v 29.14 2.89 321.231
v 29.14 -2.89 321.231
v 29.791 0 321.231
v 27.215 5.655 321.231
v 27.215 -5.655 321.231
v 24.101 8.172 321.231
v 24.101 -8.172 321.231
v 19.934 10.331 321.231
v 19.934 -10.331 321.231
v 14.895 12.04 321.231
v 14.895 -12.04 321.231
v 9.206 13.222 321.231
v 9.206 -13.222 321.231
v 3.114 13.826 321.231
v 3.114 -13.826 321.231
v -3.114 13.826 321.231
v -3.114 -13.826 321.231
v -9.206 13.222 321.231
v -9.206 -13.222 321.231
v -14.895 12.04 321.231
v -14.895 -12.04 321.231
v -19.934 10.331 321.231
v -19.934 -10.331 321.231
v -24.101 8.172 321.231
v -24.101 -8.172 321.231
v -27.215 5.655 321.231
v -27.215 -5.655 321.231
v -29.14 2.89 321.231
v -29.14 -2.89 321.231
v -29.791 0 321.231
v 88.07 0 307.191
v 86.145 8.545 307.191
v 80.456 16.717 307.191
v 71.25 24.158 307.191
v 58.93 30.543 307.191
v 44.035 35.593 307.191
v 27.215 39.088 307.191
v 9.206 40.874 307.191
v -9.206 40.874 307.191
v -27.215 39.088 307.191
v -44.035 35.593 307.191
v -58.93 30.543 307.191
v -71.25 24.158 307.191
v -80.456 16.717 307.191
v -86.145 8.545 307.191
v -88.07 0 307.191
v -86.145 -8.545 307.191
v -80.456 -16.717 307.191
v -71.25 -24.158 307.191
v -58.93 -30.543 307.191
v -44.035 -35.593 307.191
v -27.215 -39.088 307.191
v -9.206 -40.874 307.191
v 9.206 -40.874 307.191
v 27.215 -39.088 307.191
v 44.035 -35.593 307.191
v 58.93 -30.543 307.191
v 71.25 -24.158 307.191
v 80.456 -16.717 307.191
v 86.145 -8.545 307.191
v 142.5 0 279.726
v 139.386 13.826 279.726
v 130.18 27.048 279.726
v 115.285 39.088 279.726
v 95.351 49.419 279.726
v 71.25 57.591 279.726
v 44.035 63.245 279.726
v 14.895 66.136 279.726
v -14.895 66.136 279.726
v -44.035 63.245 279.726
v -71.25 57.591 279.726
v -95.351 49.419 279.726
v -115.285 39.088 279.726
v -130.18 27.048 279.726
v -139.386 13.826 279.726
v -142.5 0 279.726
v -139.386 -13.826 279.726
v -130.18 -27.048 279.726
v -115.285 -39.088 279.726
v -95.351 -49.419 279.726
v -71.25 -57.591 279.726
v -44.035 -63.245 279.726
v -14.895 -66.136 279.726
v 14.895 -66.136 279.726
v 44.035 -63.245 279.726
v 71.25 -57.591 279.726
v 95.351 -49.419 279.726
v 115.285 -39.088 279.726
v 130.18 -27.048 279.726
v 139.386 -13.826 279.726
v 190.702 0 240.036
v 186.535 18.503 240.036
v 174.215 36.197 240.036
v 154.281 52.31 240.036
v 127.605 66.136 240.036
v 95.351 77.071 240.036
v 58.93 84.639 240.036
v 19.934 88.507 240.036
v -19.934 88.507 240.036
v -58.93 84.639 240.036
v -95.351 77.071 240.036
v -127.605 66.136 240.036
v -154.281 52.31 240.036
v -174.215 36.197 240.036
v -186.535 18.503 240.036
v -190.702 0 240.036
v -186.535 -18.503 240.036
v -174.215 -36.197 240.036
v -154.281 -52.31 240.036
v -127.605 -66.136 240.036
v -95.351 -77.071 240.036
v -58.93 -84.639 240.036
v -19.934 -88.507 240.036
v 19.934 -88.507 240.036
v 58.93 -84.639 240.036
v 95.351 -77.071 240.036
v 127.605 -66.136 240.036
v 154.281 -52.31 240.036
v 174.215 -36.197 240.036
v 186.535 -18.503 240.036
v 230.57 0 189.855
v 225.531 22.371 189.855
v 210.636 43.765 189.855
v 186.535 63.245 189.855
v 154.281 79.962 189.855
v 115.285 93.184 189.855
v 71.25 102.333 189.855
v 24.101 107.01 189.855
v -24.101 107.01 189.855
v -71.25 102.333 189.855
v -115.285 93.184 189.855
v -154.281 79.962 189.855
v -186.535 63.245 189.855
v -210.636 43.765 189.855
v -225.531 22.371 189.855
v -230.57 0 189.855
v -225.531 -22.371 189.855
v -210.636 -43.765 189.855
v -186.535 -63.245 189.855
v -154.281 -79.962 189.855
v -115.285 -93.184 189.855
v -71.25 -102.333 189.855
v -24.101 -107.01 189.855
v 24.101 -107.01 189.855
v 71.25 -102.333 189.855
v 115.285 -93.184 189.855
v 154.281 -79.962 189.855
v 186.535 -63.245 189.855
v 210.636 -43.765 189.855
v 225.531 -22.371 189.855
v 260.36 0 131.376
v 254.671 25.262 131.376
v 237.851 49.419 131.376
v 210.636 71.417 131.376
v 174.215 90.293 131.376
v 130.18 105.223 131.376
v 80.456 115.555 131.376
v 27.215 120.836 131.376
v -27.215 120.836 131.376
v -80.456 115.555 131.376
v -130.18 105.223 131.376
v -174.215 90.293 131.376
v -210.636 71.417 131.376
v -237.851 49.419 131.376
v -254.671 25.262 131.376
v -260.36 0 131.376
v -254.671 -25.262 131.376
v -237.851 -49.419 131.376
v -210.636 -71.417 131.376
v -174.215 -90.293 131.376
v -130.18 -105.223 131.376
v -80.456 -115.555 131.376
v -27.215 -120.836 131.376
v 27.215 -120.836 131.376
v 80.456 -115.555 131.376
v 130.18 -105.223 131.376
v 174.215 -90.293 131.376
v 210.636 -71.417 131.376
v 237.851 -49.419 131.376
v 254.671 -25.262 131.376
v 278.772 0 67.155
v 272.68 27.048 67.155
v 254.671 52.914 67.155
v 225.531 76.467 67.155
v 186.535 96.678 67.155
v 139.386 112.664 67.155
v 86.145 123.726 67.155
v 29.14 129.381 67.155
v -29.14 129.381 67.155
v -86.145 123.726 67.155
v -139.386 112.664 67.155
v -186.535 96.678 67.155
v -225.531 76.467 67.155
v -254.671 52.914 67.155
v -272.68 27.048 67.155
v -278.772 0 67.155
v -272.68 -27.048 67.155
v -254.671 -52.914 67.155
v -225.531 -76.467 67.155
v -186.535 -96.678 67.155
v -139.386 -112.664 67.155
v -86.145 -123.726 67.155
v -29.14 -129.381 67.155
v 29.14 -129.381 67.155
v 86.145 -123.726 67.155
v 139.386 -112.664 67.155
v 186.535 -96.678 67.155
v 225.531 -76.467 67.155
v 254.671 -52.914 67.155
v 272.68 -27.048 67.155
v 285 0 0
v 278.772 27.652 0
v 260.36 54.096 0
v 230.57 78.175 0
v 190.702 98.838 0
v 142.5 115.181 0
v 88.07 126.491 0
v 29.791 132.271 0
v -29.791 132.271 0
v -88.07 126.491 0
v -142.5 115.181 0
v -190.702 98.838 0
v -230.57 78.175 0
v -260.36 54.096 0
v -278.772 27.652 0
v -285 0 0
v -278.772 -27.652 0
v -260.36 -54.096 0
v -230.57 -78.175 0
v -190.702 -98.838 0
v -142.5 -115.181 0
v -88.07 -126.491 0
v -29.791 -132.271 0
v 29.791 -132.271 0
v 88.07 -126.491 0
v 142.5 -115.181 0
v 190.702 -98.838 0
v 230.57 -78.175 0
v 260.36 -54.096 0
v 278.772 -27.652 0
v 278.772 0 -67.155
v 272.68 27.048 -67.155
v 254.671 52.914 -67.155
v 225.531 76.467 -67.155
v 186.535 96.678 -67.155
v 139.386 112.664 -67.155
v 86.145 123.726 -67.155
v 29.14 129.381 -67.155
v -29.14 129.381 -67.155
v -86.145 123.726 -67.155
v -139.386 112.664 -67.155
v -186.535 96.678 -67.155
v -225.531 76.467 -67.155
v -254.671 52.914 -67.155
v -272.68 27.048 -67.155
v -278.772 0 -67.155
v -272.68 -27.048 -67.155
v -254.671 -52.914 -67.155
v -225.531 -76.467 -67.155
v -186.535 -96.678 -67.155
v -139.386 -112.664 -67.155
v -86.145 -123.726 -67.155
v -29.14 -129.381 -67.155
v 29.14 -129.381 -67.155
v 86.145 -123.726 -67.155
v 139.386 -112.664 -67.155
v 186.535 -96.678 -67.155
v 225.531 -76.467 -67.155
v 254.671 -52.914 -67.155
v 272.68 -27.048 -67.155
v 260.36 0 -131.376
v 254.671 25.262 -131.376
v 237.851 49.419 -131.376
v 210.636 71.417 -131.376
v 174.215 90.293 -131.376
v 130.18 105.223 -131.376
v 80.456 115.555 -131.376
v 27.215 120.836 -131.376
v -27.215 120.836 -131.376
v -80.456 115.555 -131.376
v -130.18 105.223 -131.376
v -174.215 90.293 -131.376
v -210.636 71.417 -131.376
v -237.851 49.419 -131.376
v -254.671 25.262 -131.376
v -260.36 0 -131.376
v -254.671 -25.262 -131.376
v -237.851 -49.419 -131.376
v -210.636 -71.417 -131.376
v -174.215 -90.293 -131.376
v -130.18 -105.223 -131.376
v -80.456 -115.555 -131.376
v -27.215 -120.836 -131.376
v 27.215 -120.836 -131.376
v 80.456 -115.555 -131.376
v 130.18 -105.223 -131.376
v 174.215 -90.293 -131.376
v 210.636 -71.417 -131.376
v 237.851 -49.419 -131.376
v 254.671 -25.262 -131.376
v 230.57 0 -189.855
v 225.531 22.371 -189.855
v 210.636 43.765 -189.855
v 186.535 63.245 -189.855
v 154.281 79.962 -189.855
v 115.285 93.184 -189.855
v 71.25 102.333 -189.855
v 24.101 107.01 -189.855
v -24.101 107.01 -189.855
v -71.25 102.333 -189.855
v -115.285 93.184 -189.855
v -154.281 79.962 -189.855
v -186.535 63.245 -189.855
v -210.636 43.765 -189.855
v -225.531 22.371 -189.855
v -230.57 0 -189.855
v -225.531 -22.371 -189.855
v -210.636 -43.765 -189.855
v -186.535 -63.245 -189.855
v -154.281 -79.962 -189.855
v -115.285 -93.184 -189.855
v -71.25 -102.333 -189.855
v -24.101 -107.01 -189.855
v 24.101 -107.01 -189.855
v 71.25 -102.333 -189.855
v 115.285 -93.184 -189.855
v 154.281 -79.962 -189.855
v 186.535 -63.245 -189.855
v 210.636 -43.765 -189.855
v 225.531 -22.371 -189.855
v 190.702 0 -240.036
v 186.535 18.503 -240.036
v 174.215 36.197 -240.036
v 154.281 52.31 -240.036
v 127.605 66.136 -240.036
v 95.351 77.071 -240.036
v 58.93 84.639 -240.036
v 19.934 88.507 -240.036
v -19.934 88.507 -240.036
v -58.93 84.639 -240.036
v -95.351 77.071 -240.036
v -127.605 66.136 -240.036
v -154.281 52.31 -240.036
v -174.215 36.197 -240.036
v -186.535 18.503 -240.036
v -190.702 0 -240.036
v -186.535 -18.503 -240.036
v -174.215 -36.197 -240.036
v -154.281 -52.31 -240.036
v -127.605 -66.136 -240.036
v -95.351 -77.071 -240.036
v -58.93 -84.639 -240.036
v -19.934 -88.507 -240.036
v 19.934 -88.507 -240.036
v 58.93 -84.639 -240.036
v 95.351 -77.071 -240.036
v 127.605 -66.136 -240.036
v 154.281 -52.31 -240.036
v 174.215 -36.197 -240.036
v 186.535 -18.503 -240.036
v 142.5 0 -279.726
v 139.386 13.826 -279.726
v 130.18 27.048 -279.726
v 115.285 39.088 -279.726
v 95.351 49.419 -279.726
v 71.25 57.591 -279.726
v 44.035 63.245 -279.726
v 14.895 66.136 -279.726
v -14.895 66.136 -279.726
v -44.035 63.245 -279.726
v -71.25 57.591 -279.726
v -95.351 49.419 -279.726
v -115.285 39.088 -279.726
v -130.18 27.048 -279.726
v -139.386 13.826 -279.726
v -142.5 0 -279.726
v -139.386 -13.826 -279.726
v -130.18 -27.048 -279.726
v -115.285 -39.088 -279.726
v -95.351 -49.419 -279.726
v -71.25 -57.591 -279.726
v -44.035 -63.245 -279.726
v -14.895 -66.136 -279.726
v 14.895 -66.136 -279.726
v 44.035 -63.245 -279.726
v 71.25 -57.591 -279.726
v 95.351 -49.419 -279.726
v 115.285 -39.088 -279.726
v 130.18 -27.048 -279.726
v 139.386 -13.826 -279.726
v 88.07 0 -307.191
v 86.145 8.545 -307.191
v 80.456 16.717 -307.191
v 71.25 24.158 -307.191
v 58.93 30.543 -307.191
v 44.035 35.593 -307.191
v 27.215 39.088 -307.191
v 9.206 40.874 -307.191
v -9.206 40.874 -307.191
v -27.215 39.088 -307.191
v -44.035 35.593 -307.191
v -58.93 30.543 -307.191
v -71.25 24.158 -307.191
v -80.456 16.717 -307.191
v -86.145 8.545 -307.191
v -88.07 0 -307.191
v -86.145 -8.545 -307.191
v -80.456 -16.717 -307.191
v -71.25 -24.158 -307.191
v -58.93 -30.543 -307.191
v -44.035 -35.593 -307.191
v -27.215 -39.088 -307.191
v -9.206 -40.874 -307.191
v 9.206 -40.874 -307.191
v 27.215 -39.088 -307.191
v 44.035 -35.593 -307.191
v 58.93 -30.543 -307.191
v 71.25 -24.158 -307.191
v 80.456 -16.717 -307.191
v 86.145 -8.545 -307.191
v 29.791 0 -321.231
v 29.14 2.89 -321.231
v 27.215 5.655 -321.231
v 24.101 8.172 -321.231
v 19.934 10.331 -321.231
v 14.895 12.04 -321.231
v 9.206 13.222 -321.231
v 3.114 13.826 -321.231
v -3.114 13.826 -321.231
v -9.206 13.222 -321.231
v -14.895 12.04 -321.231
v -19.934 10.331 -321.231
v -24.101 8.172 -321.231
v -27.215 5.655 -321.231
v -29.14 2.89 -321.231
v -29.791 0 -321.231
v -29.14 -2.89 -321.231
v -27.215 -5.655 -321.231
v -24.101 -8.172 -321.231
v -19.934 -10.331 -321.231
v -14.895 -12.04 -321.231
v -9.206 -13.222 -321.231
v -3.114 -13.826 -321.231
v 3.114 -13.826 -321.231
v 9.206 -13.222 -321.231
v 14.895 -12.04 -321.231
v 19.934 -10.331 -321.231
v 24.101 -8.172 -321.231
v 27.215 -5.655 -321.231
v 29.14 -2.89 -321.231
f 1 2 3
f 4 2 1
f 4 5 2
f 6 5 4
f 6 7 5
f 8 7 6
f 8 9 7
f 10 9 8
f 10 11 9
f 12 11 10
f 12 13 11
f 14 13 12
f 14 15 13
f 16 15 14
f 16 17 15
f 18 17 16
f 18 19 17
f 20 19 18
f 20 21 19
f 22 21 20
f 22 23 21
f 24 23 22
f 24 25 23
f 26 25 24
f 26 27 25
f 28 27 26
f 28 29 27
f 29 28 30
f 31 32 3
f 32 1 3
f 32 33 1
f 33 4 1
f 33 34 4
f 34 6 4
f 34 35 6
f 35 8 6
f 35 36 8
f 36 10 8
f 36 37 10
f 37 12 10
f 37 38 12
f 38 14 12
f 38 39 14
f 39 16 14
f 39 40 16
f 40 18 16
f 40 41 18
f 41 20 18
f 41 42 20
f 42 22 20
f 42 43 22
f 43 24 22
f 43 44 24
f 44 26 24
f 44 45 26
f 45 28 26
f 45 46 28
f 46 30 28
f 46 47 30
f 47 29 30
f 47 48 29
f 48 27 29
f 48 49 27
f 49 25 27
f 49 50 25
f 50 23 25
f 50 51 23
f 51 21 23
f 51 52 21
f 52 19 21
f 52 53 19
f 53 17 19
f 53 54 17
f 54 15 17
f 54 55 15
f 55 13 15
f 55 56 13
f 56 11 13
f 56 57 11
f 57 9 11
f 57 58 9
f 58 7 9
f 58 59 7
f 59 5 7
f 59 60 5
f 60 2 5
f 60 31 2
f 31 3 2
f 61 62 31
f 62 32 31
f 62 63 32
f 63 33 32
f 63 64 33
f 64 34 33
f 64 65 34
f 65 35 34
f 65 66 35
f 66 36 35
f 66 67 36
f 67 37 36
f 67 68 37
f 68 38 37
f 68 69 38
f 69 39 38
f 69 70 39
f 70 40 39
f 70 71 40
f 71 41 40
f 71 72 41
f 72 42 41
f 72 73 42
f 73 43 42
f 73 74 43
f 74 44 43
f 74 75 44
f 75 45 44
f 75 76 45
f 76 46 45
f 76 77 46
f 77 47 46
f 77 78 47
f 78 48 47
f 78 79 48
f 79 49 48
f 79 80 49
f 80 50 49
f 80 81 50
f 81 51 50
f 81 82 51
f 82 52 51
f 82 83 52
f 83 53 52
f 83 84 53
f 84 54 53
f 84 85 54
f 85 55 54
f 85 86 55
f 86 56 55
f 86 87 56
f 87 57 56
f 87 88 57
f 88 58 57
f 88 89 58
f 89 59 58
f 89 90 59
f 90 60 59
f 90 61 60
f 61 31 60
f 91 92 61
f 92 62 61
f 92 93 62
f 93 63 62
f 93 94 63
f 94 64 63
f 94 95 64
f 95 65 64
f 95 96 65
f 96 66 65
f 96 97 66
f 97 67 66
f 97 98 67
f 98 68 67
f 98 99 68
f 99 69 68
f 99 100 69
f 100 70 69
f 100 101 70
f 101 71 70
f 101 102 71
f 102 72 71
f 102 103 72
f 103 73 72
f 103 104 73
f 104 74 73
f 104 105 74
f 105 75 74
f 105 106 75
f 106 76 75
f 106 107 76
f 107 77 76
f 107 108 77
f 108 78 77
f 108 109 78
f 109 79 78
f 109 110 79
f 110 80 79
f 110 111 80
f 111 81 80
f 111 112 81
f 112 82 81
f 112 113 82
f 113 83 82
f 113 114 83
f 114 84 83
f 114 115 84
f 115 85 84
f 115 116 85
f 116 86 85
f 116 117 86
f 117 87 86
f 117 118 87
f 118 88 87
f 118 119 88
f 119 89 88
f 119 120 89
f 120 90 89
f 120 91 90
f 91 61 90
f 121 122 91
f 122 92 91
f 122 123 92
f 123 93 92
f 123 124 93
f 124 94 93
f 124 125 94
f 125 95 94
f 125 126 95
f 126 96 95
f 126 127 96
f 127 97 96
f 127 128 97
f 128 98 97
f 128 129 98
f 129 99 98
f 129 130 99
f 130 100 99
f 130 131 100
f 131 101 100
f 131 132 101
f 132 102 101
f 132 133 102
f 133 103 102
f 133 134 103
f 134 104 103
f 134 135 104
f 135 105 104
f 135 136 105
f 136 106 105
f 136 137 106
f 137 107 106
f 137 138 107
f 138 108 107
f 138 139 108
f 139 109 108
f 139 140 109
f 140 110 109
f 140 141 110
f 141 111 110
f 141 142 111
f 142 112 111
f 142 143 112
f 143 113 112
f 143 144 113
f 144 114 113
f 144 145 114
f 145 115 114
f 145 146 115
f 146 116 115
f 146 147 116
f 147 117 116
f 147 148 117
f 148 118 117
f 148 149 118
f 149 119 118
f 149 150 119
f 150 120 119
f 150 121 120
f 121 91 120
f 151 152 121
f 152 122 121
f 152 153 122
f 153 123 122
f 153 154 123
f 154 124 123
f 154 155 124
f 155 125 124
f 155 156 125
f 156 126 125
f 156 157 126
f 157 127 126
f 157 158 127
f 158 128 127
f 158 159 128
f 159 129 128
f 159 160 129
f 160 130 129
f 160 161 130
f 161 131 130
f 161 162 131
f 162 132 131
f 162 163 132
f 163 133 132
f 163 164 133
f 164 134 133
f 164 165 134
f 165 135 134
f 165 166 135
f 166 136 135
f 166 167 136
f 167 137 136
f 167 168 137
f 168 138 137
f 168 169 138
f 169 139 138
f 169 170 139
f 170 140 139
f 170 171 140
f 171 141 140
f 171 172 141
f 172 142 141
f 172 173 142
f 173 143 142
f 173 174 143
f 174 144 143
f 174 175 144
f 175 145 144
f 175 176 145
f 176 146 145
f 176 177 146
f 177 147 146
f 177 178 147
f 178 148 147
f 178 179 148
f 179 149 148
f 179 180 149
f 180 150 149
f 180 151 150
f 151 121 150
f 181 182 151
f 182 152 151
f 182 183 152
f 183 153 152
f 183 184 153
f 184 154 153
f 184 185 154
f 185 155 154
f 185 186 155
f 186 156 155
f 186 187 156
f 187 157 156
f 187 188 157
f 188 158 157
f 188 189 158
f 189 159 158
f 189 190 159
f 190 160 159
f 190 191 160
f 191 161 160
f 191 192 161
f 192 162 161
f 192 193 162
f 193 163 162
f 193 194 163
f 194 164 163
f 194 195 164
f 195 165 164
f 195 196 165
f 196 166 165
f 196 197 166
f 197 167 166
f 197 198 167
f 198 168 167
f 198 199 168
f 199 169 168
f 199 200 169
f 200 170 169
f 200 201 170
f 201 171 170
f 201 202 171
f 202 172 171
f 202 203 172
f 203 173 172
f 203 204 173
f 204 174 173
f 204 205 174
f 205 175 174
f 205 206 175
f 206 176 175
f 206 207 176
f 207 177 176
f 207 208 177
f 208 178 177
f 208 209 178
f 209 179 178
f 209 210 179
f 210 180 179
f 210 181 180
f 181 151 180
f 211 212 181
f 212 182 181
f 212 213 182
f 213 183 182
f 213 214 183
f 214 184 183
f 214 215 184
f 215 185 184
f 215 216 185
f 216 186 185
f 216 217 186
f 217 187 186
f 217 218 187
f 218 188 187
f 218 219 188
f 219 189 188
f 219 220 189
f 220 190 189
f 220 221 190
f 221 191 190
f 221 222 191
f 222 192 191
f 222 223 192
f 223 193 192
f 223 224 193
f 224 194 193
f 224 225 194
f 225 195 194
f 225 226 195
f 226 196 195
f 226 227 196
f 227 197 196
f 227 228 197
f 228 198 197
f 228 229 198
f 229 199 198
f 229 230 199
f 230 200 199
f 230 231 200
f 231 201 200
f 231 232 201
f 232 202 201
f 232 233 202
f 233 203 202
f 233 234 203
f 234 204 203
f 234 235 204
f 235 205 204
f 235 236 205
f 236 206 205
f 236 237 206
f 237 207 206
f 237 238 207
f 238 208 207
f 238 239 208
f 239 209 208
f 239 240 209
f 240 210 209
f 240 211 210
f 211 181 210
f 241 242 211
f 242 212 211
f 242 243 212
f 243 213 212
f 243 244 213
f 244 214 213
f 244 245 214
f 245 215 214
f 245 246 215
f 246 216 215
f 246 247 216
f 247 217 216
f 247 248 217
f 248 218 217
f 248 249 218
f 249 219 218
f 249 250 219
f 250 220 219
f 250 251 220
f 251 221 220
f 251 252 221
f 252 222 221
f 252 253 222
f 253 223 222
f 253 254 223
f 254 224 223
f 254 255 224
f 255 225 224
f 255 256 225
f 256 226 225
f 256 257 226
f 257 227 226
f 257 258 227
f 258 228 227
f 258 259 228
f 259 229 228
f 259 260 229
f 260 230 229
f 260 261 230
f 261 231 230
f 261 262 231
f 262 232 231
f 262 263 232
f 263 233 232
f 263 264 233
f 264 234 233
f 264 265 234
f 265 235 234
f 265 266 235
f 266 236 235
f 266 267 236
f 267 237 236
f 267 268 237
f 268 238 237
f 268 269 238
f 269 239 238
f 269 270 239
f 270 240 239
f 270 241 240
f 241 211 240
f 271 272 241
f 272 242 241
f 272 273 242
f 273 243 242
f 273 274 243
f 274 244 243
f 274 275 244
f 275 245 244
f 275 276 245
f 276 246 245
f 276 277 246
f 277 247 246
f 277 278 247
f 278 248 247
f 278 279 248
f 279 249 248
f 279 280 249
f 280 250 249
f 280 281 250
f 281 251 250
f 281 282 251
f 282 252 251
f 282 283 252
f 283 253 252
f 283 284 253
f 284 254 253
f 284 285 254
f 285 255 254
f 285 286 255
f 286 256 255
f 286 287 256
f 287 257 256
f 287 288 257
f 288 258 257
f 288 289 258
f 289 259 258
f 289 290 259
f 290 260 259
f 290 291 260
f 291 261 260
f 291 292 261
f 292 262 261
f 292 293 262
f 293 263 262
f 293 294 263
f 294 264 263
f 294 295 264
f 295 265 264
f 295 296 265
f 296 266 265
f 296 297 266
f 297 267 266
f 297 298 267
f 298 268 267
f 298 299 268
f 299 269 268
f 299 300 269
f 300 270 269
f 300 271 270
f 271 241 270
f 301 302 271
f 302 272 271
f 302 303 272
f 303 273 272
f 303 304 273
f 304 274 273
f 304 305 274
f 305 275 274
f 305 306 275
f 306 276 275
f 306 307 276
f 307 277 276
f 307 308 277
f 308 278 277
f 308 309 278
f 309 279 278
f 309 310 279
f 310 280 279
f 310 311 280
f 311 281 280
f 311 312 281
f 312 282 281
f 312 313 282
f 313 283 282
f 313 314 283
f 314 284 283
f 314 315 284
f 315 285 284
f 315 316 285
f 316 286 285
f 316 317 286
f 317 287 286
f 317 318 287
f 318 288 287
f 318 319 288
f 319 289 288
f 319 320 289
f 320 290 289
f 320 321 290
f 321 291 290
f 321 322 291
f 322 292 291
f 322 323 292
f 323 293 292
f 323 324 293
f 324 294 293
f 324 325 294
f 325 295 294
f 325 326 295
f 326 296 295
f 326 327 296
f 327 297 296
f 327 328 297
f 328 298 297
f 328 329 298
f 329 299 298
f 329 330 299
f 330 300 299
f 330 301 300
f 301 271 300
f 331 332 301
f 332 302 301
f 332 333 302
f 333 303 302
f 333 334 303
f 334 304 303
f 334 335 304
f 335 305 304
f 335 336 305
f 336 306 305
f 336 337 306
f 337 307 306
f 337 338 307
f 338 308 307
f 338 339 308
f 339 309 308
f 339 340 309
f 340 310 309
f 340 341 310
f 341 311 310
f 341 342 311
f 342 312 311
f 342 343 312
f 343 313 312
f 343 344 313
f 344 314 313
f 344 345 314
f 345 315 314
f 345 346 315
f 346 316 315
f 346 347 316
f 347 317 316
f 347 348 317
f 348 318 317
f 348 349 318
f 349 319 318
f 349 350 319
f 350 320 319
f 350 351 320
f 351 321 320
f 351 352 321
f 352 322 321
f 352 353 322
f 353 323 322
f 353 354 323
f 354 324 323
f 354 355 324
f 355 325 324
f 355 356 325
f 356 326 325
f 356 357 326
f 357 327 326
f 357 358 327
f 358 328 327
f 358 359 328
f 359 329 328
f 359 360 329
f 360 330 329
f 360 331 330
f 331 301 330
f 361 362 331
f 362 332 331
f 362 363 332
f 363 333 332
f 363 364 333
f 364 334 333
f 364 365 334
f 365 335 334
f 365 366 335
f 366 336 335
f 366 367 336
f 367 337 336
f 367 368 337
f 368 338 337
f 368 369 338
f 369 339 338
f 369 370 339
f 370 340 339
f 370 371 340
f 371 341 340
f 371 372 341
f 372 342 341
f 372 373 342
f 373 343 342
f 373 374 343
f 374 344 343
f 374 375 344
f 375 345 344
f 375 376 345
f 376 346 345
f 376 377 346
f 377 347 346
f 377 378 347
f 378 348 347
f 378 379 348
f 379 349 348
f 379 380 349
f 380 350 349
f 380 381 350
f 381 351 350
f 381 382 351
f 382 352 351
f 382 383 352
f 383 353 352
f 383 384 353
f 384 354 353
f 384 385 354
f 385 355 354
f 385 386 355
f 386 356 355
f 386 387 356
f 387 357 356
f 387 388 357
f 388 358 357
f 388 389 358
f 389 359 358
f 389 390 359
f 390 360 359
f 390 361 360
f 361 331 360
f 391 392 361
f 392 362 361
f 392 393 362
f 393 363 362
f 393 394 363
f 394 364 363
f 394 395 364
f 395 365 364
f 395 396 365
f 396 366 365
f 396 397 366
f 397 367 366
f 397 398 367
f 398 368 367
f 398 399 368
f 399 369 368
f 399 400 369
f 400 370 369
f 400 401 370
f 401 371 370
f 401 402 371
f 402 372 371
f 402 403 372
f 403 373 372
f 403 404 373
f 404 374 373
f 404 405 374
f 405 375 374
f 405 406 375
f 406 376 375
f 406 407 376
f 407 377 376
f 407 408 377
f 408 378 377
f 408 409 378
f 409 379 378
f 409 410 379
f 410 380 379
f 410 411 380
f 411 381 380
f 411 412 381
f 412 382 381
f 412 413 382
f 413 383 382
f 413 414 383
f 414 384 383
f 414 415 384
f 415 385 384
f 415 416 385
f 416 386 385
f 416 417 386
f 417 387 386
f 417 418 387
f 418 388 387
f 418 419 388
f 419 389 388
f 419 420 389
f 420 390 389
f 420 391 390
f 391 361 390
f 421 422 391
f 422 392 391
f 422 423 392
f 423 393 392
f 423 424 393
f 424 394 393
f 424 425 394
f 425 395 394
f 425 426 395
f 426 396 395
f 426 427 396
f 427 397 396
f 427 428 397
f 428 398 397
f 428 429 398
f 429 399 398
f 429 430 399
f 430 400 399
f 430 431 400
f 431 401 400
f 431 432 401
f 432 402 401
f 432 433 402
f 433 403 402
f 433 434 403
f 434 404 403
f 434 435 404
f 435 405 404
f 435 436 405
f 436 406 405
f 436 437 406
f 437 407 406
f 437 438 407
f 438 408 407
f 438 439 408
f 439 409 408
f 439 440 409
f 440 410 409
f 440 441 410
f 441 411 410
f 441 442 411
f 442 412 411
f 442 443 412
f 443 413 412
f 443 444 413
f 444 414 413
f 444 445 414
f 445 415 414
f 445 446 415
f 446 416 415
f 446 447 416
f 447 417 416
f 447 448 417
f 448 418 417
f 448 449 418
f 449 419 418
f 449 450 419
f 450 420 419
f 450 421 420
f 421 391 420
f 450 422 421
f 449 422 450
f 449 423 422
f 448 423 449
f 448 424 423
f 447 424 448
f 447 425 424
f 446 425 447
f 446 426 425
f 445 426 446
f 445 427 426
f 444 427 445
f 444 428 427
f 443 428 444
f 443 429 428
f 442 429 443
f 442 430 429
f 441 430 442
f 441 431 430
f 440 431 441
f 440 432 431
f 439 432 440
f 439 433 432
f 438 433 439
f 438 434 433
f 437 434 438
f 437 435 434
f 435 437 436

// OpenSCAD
// Generated by SolidPython 1.0.1 on 2020-07-29 00:46:51


scale(v = [15, 7, 17]) {
	sphere(r = 19);
}
/***********************************************
*********      SolidPython code:      **********
************************************************
 
# import packages: SolidPython
from solid import *
from solid.utils import *
from itertools import chain, combinations, permutations


class Resize:

    def __init__(self, scad_file):
        self.scad_file = scad_file
        #self.scad_file = import_scad(scad_file)
        # cone/cylinder param:
        self.r1 = 0
        self.r2 = 0
        self.h = 0
        # rectangular prism param:
        self.w = 0
        self.l = 0
        # ellipse param:
        self.r = 0

    # import OpenScad code (file name corresponds to shape)


    # classify shape + parameters
    def assign(self, param1, param2, param3):
        if self.scad_file == 'cone.scad':
            self.r1 = param1
            self.r2 = param2
            self.h = param3
        elif self.scad_file == 'cylinder.scad':
            self.r1 = param1
            self.r2 = param2
            self.h = param3
        elif self.scad_file == 'rectangularPrism.scad':
            self.h = param1
            self.l = param2
            self.w = param3
        else:
            self.r = param1
            self.h = param2

    # resize parameters
    def iterate(self):
        x = range(3, 20, 2)
        i = 1
        if self.scad_file == 'cone.scad':
            tempList = list(permutations(x, 2))
            for temp in tempList:
                param1 = temp[0]
                param2 = temp[1]
                filepath = 'produced_scad_files/' + 'cone' + str(param1) + '_' + str(param2) + '_' + '.scad'
                scad_render_to_file(cylinder(h=param1, r1=param2, r2=0), filepath)

        elif self.scad_file == 'cylinder.scad':
            tempList = list(permutations(x, 3))
            for temp in tempList:
                param1 = temp[0]
                param2 = temp[1]
                filepath = 'produced_scad_files/' + 'cylinder' + str(param1) + '_' + str(param2) + '_' + '.scad'
                scad_render_to_file(cylinder(h=param1, r1=param2, r2=param2), filepath)

        elif self.scad_file == 'rectangularPrism.scad':
            tempList = list(permutations(x, 3))
            for temp in tempList:
                param1 = temp[0]
                param2 = temp[1]
                param3 = temp[2]
                filepath = 'produced_scad_files/' + 'rectangularPrism' + str(param1) + '_' + str(param2) + '_' + str(
                    param3) + '.scad'
                scad_render_to_file(cube(size=(param1, param2, param3)), filepath)

        elif self.scad_file == 'ellipse.scad':
            tempList = list(permutations(x, 4))
            for temp in tempList:
                param1 = temp[0]
                param2 = temp[1]
                param3 = temp[2]
                param4 = temp[3]
                filepath = 'produced_scad_files/' + 'ellipse' + str(param1) + '_' + str(param2) + '_' + str(param3) + '_' + str(param4) + '.scad'
                scad_render_to_file(scale([param1, param2, param3])(sphere(r=param4)), filepath)

    def render_to_scadfile(self):
        scad_render_to_file(scad, 'example.scad') 
 
************************************************/
